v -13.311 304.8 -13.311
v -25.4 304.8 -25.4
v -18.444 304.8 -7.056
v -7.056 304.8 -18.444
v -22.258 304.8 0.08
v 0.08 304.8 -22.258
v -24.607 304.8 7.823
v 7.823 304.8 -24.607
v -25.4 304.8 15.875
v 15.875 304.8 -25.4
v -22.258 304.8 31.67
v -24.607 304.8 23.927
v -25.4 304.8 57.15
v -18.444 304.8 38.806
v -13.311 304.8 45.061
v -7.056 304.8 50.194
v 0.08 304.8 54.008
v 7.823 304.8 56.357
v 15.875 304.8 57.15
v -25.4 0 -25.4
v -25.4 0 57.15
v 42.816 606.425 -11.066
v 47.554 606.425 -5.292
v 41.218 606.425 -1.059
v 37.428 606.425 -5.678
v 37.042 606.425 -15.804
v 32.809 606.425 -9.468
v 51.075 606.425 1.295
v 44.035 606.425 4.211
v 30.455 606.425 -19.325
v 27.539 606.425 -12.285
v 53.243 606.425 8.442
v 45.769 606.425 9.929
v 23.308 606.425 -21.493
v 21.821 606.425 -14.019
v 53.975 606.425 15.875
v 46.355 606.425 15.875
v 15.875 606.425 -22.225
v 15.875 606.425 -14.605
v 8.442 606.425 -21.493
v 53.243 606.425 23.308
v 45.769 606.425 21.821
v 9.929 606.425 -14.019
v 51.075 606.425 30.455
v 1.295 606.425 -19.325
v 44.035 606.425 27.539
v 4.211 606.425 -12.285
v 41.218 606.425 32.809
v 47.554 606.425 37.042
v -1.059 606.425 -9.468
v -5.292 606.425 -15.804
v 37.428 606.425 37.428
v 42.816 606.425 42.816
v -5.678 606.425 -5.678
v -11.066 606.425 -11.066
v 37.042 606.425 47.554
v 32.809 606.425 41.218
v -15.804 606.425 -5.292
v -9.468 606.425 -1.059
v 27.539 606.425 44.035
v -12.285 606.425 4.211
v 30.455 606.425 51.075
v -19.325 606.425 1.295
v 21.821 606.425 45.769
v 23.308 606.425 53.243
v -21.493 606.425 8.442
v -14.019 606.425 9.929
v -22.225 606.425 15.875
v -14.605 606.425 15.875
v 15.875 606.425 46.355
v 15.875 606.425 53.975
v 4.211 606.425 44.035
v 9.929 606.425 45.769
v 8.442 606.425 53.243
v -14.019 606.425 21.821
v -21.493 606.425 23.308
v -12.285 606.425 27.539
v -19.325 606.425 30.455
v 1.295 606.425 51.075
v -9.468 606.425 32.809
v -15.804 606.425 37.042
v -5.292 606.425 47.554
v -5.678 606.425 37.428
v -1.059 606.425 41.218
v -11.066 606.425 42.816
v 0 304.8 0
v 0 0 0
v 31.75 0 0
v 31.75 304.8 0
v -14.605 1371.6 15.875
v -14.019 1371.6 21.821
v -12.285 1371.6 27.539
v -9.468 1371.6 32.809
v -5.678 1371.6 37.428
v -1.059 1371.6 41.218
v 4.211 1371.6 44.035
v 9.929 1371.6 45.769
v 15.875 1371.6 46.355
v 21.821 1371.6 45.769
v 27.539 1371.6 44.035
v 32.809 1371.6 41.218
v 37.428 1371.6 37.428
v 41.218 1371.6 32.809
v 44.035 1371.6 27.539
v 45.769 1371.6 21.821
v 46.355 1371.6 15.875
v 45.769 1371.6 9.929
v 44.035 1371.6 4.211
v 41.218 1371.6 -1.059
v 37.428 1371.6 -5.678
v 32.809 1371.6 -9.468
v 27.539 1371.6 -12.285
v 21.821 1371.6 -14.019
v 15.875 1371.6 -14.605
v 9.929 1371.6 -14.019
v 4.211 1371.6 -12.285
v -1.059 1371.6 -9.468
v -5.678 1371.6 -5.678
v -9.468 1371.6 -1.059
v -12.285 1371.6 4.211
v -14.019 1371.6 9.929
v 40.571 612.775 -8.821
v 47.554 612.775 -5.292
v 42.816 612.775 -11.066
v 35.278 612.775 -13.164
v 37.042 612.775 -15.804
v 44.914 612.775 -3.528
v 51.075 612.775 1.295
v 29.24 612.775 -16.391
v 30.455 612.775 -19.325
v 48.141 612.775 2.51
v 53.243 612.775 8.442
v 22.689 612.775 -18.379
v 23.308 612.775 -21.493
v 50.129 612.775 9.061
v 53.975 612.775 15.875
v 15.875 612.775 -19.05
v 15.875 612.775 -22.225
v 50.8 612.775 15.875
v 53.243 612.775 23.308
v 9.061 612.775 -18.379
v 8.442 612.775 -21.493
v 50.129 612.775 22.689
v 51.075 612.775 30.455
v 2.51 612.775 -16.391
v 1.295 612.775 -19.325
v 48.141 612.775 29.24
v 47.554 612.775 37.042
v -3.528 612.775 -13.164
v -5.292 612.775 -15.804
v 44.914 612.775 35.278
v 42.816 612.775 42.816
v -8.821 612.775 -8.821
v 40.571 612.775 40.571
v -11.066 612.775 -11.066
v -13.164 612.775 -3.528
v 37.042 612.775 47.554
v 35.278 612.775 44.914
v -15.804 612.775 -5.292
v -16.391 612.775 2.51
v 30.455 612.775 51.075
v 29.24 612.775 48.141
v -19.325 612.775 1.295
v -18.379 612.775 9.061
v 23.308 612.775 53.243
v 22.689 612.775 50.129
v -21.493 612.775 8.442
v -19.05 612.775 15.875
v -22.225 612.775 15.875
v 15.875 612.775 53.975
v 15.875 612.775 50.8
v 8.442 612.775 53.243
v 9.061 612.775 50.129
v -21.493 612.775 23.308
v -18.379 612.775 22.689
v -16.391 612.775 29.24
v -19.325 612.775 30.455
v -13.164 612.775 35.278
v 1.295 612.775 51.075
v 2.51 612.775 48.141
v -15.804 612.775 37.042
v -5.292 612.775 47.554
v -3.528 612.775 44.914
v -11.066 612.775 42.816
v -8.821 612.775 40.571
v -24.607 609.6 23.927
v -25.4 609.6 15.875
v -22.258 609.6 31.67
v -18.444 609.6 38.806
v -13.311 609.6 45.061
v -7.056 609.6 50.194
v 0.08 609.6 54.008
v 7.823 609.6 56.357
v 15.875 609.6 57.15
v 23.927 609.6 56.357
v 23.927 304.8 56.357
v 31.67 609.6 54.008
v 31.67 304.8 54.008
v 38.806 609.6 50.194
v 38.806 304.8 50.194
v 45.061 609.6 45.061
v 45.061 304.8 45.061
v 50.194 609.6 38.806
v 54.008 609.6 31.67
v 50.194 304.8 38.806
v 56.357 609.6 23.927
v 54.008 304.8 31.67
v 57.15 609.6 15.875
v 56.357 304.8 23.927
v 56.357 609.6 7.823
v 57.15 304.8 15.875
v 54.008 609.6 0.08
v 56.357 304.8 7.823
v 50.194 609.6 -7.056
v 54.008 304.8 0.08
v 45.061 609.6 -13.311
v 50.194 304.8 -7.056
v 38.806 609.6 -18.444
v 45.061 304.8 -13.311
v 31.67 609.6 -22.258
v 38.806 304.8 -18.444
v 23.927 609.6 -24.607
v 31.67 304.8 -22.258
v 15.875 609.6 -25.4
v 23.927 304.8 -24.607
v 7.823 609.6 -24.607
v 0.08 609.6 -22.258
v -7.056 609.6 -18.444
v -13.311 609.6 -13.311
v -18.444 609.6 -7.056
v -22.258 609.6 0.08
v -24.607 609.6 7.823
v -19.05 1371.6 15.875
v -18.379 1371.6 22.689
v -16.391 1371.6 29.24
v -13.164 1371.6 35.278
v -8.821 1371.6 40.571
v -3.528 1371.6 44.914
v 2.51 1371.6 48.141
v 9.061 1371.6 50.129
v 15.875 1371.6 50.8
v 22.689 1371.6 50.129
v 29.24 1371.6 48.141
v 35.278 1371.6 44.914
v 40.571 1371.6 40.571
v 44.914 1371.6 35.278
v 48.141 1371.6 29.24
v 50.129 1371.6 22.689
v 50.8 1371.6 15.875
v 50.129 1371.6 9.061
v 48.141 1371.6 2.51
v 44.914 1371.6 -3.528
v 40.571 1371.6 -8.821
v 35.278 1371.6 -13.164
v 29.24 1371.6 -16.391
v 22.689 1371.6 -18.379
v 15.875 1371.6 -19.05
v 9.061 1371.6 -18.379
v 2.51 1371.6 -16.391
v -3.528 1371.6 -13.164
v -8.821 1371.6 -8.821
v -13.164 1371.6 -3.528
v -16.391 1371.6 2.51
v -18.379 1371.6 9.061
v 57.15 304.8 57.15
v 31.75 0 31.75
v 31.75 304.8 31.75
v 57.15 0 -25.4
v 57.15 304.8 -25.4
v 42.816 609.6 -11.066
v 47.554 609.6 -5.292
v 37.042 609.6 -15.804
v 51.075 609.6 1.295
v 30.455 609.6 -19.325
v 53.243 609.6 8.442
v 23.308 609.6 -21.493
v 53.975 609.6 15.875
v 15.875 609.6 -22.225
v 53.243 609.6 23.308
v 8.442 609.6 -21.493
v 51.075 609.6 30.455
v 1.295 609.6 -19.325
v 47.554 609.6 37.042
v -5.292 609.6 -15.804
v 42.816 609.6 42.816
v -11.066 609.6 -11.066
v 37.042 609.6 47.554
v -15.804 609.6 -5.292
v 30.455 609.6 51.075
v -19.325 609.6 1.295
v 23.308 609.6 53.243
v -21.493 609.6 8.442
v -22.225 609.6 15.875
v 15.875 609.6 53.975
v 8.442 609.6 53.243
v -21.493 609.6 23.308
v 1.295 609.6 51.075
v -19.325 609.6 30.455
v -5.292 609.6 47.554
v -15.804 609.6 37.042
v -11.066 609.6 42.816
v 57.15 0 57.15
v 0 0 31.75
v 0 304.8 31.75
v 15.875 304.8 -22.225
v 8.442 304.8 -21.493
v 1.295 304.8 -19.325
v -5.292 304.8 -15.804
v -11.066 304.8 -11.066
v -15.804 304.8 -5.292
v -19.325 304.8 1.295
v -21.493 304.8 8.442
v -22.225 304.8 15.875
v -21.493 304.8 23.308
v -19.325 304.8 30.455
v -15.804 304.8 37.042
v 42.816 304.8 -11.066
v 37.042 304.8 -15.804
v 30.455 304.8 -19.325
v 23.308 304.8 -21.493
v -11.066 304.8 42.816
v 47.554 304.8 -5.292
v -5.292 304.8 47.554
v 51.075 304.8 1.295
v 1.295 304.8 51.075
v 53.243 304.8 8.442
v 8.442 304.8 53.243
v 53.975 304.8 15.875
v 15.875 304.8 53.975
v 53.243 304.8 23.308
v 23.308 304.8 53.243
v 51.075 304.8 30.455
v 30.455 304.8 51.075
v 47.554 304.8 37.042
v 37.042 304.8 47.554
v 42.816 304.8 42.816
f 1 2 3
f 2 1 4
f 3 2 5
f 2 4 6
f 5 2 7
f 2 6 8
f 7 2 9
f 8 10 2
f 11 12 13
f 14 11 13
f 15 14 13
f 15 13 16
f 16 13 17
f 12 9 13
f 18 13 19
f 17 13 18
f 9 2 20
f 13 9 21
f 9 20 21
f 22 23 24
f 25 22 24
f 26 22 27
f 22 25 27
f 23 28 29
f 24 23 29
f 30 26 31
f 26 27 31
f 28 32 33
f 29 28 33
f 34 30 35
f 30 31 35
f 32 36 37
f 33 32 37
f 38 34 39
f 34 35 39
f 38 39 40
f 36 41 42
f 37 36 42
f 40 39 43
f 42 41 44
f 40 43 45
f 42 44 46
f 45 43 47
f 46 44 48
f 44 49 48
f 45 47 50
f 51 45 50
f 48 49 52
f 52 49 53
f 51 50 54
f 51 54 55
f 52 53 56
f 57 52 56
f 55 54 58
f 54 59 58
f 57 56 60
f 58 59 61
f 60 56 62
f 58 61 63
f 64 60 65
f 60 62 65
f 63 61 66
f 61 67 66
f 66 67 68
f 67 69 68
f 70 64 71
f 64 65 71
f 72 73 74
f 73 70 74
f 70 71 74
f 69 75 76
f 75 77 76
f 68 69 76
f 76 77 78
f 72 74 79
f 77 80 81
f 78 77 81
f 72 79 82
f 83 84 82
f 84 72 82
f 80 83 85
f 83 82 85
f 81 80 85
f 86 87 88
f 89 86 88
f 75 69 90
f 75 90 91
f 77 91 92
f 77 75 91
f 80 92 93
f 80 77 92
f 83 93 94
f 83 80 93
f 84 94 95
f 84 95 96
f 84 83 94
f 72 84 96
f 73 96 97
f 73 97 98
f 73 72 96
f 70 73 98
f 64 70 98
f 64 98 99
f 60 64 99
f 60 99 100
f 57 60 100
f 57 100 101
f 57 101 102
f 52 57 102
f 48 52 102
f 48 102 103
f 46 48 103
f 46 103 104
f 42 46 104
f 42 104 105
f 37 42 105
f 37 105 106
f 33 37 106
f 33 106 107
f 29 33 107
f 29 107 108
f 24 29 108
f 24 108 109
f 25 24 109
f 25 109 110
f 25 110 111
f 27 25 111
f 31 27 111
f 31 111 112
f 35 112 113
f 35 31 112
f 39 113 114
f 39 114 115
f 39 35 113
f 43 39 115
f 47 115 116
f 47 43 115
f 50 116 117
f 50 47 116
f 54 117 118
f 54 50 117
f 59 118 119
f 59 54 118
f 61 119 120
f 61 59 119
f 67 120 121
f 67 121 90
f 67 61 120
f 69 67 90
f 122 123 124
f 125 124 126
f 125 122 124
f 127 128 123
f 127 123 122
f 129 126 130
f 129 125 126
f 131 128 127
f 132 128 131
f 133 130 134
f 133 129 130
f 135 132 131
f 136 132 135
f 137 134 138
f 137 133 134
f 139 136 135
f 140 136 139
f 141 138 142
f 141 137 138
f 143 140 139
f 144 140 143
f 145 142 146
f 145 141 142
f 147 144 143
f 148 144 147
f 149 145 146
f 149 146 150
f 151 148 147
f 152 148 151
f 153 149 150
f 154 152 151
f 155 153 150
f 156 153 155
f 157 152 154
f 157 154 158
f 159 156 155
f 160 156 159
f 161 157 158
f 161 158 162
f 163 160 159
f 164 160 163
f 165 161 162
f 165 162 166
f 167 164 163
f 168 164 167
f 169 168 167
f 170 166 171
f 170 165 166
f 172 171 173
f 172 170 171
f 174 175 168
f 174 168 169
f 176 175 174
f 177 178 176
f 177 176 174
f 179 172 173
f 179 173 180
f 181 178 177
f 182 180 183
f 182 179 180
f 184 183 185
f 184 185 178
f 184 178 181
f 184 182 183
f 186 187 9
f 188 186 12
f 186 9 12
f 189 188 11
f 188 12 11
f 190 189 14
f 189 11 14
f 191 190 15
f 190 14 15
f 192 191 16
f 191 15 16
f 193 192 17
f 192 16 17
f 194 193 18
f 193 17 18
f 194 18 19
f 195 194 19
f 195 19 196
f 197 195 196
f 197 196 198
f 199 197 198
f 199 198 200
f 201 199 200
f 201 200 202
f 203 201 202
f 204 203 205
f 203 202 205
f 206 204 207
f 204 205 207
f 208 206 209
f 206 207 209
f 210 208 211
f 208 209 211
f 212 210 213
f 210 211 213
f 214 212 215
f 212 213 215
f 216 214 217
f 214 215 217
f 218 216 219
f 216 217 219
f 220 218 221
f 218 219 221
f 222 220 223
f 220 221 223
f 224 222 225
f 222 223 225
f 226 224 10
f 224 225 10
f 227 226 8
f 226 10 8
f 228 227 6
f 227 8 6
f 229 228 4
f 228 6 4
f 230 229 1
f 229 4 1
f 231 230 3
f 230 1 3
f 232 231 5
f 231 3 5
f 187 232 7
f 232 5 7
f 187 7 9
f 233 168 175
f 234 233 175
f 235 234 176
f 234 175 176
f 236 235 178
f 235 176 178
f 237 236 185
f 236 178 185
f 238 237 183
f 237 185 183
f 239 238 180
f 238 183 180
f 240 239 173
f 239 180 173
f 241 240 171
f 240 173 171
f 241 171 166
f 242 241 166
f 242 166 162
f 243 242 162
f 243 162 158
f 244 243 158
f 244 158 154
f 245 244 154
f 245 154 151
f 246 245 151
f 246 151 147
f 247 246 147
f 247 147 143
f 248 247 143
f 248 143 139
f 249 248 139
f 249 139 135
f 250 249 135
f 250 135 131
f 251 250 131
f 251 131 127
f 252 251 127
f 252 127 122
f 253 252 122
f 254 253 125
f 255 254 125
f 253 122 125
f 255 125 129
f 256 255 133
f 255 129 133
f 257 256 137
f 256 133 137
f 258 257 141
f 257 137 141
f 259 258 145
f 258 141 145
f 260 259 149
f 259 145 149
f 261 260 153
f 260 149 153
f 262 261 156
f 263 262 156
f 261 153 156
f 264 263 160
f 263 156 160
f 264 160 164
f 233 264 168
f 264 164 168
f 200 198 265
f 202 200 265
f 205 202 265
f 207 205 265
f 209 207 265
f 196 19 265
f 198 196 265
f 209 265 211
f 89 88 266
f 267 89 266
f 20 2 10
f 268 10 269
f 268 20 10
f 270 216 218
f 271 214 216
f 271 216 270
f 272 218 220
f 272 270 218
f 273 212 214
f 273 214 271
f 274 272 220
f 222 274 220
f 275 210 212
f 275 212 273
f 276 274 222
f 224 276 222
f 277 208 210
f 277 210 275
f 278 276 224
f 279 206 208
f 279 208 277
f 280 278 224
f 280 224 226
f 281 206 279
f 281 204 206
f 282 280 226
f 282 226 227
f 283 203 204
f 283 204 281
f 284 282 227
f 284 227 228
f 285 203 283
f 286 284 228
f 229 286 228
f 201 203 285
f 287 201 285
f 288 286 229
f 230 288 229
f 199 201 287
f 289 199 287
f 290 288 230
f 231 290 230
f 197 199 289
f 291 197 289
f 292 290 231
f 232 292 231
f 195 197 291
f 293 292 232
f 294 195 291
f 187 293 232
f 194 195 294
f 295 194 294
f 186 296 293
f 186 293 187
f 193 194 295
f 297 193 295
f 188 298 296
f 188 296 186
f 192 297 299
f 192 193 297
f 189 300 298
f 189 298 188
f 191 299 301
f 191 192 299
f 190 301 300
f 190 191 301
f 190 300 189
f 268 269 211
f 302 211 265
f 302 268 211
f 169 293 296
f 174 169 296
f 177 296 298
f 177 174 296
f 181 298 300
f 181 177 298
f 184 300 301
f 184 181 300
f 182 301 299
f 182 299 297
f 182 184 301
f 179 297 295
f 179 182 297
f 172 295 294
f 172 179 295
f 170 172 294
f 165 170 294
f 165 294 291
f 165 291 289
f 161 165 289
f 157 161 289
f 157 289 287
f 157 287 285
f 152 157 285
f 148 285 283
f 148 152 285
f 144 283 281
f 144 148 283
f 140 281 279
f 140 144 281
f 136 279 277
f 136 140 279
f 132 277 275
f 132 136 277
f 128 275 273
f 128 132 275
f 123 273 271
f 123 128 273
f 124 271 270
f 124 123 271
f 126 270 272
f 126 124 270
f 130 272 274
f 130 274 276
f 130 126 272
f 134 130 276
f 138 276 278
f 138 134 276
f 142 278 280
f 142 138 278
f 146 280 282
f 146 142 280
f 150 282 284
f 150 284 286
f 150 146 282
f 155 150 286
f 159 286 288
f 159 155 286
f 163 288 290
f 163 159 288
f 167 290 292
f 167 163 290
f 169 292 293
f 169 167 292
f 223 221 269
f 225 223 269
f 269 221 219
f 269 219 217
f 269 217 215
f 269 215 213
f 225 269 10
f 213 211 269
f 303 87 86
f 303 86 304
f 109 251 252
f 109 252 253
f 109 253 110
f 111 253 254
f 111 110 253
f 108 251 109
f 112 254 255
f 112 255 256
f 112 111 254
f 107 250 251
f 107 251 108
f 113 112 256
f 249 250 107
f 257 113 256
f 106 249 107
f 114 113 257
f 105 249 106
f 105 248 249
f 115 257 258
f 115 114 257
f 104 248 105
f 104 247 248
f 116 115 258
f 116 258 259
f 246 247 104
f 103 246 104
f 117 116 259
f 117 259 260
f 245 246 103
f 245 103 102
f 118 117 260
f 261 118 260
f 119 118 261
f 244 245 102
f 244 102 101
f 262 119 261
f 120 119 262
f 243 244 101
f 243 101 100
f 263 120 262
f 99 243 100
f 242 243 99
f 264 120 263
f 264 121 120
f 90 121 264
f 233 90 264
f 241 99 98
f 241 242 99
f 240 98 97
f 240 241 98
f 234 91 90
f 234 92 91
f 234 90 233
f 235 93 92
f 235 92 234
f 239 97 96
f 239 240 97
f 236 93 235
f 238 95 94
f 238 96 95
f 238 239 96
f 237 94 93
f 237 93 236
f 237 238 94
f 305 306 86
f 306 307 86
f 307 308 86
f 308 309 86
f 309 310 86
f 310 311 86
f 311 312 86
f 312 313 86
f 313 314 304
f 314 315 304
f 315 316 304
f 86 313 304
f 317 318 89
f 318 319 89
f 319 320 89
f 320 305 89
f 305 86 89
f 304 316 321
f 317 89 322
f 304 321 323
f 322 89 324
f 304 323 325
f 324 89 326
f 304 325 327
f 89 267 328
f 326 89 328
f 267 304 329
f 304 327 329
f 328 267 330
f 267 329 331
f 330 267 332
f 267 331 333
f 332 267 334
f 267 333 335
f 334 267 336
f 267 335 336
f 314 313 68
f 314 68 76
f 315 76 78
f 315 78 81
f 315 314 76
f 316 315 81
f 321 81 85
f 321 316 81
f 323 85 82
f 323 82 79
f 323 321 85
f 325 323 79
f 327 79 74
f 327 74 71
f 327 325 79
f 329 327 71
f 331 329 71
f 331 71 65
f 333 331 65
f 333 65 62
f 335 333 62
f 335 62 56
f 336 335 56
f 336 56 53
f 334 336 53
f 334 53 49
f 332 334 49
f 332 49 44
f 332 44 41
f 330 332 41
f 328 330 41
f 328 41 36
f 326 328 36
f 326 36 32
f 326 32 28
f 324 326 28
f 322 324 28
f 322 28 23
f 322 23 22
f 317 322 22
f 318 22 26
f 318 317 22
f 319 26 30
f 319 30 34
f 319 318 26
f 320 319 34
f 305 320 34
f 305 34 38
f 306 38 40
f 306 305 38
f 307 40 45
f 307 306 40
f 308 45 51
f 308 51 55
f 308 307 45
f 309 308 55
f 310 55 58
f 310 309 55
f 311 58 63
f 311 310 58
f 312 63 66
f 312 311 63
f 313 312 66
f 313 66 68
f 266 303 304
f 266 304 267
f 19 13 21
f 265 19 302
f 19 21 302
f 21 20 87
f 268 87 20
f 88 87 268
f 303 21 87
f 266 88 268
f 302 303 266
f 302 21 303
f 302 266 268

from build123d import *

# Parameters (mm, degrees)
F0_W     = 82.55
F0_H     = 82.55
F0_W_2   = 31.75
F0_H_2   = 31.75
F1_DEPTH = 304.8
F2_R     = 38.1
F3_DEPTH = 304.8
F4_R     = 34.925
F4_R_2   = 30.48
F5_DEPTH = 762
F6_R     = 38.1
F6_R_2   = 30.48
F7_DEPTH = 3.175


with BuildPart() as f1:
    # F0 (on Front) → F1 (new body)
    with BuildSketch(Plane.XZ):
        with Locations((15.875, 15.875)):
            Rectangle(F0_W, F0_H)
        with Locations((15.875, 15.875)):
            Rectangle(F0_W_2, F0_H_2, mode=Mode.SUBTRACT)
    extrude(amount=-F1_DEPTH)

    # F2 (on face) → F3 (join)
    with BuildSketch(Plane(origin=(0, 304.8, 0), x_dir=(-1, 0, 0), z_dir=(0, 1, 0))):
        with BuildLine():
            ThreePointArc((-15.8749998581, -25.4), (13.3108324437, -13.3108323433), (25.4, 15.875))
            ThreePointArc((25.4, 15.875), (13.3108323935, 45.0608323935), (-15.875, 57.15))
            ThreePointArc((-15.875, 57.15), (-45.0608324126, 45.0608323743), (-57.15, 15.8749999458))
            ThreePointArc((-57.15, 15.8749999458), (-45.0608323241, -13.3108324628), (-15.8749998581, -25.4))
        make_face()
        with Locations((-15.875, 15.875)):
            Circle(F2_R, mode=Mode.SUBTRACT)
    extrude(amount=F3_DEPTH)



with BuildPart() as f5:
    # F4 (on face) → F5 (new body)
    with BuildSketch(Plane(origin=(0, 609.6, 0), x_dir=(-1, 0, 0), z_dir=(0, 1, 0))):
        with Locations((-15.875, 15.875)):
            Circle(F4_R)
        with Locations((-15.875, 15.875)):
            Circle(F4_R_2, mode=Mode.SUBTRACT)
    extrude(amount=F5_DEPTH)


with BuildPart() as f1_1:
    add(f1.part)

    add(f5.part)  # F7 merges F5
    # F6 (on face) → F7 (join, symmetric)
    with BuildSketch(Plane(origin=(0, 609.6, 0), x_dir=(-1, 0, 0), z_dir=(0, 1, 0))):
        with Locations((-15.875, 15.875)):
            Circle(F6_R)
        with Locations((-15.875, 15.875)):
            Circle(F6_R_2, mode=Mode.SUBTRACT)
    extrude(amount=F7_DEPTH, both=True)


solid = f1_1.part
